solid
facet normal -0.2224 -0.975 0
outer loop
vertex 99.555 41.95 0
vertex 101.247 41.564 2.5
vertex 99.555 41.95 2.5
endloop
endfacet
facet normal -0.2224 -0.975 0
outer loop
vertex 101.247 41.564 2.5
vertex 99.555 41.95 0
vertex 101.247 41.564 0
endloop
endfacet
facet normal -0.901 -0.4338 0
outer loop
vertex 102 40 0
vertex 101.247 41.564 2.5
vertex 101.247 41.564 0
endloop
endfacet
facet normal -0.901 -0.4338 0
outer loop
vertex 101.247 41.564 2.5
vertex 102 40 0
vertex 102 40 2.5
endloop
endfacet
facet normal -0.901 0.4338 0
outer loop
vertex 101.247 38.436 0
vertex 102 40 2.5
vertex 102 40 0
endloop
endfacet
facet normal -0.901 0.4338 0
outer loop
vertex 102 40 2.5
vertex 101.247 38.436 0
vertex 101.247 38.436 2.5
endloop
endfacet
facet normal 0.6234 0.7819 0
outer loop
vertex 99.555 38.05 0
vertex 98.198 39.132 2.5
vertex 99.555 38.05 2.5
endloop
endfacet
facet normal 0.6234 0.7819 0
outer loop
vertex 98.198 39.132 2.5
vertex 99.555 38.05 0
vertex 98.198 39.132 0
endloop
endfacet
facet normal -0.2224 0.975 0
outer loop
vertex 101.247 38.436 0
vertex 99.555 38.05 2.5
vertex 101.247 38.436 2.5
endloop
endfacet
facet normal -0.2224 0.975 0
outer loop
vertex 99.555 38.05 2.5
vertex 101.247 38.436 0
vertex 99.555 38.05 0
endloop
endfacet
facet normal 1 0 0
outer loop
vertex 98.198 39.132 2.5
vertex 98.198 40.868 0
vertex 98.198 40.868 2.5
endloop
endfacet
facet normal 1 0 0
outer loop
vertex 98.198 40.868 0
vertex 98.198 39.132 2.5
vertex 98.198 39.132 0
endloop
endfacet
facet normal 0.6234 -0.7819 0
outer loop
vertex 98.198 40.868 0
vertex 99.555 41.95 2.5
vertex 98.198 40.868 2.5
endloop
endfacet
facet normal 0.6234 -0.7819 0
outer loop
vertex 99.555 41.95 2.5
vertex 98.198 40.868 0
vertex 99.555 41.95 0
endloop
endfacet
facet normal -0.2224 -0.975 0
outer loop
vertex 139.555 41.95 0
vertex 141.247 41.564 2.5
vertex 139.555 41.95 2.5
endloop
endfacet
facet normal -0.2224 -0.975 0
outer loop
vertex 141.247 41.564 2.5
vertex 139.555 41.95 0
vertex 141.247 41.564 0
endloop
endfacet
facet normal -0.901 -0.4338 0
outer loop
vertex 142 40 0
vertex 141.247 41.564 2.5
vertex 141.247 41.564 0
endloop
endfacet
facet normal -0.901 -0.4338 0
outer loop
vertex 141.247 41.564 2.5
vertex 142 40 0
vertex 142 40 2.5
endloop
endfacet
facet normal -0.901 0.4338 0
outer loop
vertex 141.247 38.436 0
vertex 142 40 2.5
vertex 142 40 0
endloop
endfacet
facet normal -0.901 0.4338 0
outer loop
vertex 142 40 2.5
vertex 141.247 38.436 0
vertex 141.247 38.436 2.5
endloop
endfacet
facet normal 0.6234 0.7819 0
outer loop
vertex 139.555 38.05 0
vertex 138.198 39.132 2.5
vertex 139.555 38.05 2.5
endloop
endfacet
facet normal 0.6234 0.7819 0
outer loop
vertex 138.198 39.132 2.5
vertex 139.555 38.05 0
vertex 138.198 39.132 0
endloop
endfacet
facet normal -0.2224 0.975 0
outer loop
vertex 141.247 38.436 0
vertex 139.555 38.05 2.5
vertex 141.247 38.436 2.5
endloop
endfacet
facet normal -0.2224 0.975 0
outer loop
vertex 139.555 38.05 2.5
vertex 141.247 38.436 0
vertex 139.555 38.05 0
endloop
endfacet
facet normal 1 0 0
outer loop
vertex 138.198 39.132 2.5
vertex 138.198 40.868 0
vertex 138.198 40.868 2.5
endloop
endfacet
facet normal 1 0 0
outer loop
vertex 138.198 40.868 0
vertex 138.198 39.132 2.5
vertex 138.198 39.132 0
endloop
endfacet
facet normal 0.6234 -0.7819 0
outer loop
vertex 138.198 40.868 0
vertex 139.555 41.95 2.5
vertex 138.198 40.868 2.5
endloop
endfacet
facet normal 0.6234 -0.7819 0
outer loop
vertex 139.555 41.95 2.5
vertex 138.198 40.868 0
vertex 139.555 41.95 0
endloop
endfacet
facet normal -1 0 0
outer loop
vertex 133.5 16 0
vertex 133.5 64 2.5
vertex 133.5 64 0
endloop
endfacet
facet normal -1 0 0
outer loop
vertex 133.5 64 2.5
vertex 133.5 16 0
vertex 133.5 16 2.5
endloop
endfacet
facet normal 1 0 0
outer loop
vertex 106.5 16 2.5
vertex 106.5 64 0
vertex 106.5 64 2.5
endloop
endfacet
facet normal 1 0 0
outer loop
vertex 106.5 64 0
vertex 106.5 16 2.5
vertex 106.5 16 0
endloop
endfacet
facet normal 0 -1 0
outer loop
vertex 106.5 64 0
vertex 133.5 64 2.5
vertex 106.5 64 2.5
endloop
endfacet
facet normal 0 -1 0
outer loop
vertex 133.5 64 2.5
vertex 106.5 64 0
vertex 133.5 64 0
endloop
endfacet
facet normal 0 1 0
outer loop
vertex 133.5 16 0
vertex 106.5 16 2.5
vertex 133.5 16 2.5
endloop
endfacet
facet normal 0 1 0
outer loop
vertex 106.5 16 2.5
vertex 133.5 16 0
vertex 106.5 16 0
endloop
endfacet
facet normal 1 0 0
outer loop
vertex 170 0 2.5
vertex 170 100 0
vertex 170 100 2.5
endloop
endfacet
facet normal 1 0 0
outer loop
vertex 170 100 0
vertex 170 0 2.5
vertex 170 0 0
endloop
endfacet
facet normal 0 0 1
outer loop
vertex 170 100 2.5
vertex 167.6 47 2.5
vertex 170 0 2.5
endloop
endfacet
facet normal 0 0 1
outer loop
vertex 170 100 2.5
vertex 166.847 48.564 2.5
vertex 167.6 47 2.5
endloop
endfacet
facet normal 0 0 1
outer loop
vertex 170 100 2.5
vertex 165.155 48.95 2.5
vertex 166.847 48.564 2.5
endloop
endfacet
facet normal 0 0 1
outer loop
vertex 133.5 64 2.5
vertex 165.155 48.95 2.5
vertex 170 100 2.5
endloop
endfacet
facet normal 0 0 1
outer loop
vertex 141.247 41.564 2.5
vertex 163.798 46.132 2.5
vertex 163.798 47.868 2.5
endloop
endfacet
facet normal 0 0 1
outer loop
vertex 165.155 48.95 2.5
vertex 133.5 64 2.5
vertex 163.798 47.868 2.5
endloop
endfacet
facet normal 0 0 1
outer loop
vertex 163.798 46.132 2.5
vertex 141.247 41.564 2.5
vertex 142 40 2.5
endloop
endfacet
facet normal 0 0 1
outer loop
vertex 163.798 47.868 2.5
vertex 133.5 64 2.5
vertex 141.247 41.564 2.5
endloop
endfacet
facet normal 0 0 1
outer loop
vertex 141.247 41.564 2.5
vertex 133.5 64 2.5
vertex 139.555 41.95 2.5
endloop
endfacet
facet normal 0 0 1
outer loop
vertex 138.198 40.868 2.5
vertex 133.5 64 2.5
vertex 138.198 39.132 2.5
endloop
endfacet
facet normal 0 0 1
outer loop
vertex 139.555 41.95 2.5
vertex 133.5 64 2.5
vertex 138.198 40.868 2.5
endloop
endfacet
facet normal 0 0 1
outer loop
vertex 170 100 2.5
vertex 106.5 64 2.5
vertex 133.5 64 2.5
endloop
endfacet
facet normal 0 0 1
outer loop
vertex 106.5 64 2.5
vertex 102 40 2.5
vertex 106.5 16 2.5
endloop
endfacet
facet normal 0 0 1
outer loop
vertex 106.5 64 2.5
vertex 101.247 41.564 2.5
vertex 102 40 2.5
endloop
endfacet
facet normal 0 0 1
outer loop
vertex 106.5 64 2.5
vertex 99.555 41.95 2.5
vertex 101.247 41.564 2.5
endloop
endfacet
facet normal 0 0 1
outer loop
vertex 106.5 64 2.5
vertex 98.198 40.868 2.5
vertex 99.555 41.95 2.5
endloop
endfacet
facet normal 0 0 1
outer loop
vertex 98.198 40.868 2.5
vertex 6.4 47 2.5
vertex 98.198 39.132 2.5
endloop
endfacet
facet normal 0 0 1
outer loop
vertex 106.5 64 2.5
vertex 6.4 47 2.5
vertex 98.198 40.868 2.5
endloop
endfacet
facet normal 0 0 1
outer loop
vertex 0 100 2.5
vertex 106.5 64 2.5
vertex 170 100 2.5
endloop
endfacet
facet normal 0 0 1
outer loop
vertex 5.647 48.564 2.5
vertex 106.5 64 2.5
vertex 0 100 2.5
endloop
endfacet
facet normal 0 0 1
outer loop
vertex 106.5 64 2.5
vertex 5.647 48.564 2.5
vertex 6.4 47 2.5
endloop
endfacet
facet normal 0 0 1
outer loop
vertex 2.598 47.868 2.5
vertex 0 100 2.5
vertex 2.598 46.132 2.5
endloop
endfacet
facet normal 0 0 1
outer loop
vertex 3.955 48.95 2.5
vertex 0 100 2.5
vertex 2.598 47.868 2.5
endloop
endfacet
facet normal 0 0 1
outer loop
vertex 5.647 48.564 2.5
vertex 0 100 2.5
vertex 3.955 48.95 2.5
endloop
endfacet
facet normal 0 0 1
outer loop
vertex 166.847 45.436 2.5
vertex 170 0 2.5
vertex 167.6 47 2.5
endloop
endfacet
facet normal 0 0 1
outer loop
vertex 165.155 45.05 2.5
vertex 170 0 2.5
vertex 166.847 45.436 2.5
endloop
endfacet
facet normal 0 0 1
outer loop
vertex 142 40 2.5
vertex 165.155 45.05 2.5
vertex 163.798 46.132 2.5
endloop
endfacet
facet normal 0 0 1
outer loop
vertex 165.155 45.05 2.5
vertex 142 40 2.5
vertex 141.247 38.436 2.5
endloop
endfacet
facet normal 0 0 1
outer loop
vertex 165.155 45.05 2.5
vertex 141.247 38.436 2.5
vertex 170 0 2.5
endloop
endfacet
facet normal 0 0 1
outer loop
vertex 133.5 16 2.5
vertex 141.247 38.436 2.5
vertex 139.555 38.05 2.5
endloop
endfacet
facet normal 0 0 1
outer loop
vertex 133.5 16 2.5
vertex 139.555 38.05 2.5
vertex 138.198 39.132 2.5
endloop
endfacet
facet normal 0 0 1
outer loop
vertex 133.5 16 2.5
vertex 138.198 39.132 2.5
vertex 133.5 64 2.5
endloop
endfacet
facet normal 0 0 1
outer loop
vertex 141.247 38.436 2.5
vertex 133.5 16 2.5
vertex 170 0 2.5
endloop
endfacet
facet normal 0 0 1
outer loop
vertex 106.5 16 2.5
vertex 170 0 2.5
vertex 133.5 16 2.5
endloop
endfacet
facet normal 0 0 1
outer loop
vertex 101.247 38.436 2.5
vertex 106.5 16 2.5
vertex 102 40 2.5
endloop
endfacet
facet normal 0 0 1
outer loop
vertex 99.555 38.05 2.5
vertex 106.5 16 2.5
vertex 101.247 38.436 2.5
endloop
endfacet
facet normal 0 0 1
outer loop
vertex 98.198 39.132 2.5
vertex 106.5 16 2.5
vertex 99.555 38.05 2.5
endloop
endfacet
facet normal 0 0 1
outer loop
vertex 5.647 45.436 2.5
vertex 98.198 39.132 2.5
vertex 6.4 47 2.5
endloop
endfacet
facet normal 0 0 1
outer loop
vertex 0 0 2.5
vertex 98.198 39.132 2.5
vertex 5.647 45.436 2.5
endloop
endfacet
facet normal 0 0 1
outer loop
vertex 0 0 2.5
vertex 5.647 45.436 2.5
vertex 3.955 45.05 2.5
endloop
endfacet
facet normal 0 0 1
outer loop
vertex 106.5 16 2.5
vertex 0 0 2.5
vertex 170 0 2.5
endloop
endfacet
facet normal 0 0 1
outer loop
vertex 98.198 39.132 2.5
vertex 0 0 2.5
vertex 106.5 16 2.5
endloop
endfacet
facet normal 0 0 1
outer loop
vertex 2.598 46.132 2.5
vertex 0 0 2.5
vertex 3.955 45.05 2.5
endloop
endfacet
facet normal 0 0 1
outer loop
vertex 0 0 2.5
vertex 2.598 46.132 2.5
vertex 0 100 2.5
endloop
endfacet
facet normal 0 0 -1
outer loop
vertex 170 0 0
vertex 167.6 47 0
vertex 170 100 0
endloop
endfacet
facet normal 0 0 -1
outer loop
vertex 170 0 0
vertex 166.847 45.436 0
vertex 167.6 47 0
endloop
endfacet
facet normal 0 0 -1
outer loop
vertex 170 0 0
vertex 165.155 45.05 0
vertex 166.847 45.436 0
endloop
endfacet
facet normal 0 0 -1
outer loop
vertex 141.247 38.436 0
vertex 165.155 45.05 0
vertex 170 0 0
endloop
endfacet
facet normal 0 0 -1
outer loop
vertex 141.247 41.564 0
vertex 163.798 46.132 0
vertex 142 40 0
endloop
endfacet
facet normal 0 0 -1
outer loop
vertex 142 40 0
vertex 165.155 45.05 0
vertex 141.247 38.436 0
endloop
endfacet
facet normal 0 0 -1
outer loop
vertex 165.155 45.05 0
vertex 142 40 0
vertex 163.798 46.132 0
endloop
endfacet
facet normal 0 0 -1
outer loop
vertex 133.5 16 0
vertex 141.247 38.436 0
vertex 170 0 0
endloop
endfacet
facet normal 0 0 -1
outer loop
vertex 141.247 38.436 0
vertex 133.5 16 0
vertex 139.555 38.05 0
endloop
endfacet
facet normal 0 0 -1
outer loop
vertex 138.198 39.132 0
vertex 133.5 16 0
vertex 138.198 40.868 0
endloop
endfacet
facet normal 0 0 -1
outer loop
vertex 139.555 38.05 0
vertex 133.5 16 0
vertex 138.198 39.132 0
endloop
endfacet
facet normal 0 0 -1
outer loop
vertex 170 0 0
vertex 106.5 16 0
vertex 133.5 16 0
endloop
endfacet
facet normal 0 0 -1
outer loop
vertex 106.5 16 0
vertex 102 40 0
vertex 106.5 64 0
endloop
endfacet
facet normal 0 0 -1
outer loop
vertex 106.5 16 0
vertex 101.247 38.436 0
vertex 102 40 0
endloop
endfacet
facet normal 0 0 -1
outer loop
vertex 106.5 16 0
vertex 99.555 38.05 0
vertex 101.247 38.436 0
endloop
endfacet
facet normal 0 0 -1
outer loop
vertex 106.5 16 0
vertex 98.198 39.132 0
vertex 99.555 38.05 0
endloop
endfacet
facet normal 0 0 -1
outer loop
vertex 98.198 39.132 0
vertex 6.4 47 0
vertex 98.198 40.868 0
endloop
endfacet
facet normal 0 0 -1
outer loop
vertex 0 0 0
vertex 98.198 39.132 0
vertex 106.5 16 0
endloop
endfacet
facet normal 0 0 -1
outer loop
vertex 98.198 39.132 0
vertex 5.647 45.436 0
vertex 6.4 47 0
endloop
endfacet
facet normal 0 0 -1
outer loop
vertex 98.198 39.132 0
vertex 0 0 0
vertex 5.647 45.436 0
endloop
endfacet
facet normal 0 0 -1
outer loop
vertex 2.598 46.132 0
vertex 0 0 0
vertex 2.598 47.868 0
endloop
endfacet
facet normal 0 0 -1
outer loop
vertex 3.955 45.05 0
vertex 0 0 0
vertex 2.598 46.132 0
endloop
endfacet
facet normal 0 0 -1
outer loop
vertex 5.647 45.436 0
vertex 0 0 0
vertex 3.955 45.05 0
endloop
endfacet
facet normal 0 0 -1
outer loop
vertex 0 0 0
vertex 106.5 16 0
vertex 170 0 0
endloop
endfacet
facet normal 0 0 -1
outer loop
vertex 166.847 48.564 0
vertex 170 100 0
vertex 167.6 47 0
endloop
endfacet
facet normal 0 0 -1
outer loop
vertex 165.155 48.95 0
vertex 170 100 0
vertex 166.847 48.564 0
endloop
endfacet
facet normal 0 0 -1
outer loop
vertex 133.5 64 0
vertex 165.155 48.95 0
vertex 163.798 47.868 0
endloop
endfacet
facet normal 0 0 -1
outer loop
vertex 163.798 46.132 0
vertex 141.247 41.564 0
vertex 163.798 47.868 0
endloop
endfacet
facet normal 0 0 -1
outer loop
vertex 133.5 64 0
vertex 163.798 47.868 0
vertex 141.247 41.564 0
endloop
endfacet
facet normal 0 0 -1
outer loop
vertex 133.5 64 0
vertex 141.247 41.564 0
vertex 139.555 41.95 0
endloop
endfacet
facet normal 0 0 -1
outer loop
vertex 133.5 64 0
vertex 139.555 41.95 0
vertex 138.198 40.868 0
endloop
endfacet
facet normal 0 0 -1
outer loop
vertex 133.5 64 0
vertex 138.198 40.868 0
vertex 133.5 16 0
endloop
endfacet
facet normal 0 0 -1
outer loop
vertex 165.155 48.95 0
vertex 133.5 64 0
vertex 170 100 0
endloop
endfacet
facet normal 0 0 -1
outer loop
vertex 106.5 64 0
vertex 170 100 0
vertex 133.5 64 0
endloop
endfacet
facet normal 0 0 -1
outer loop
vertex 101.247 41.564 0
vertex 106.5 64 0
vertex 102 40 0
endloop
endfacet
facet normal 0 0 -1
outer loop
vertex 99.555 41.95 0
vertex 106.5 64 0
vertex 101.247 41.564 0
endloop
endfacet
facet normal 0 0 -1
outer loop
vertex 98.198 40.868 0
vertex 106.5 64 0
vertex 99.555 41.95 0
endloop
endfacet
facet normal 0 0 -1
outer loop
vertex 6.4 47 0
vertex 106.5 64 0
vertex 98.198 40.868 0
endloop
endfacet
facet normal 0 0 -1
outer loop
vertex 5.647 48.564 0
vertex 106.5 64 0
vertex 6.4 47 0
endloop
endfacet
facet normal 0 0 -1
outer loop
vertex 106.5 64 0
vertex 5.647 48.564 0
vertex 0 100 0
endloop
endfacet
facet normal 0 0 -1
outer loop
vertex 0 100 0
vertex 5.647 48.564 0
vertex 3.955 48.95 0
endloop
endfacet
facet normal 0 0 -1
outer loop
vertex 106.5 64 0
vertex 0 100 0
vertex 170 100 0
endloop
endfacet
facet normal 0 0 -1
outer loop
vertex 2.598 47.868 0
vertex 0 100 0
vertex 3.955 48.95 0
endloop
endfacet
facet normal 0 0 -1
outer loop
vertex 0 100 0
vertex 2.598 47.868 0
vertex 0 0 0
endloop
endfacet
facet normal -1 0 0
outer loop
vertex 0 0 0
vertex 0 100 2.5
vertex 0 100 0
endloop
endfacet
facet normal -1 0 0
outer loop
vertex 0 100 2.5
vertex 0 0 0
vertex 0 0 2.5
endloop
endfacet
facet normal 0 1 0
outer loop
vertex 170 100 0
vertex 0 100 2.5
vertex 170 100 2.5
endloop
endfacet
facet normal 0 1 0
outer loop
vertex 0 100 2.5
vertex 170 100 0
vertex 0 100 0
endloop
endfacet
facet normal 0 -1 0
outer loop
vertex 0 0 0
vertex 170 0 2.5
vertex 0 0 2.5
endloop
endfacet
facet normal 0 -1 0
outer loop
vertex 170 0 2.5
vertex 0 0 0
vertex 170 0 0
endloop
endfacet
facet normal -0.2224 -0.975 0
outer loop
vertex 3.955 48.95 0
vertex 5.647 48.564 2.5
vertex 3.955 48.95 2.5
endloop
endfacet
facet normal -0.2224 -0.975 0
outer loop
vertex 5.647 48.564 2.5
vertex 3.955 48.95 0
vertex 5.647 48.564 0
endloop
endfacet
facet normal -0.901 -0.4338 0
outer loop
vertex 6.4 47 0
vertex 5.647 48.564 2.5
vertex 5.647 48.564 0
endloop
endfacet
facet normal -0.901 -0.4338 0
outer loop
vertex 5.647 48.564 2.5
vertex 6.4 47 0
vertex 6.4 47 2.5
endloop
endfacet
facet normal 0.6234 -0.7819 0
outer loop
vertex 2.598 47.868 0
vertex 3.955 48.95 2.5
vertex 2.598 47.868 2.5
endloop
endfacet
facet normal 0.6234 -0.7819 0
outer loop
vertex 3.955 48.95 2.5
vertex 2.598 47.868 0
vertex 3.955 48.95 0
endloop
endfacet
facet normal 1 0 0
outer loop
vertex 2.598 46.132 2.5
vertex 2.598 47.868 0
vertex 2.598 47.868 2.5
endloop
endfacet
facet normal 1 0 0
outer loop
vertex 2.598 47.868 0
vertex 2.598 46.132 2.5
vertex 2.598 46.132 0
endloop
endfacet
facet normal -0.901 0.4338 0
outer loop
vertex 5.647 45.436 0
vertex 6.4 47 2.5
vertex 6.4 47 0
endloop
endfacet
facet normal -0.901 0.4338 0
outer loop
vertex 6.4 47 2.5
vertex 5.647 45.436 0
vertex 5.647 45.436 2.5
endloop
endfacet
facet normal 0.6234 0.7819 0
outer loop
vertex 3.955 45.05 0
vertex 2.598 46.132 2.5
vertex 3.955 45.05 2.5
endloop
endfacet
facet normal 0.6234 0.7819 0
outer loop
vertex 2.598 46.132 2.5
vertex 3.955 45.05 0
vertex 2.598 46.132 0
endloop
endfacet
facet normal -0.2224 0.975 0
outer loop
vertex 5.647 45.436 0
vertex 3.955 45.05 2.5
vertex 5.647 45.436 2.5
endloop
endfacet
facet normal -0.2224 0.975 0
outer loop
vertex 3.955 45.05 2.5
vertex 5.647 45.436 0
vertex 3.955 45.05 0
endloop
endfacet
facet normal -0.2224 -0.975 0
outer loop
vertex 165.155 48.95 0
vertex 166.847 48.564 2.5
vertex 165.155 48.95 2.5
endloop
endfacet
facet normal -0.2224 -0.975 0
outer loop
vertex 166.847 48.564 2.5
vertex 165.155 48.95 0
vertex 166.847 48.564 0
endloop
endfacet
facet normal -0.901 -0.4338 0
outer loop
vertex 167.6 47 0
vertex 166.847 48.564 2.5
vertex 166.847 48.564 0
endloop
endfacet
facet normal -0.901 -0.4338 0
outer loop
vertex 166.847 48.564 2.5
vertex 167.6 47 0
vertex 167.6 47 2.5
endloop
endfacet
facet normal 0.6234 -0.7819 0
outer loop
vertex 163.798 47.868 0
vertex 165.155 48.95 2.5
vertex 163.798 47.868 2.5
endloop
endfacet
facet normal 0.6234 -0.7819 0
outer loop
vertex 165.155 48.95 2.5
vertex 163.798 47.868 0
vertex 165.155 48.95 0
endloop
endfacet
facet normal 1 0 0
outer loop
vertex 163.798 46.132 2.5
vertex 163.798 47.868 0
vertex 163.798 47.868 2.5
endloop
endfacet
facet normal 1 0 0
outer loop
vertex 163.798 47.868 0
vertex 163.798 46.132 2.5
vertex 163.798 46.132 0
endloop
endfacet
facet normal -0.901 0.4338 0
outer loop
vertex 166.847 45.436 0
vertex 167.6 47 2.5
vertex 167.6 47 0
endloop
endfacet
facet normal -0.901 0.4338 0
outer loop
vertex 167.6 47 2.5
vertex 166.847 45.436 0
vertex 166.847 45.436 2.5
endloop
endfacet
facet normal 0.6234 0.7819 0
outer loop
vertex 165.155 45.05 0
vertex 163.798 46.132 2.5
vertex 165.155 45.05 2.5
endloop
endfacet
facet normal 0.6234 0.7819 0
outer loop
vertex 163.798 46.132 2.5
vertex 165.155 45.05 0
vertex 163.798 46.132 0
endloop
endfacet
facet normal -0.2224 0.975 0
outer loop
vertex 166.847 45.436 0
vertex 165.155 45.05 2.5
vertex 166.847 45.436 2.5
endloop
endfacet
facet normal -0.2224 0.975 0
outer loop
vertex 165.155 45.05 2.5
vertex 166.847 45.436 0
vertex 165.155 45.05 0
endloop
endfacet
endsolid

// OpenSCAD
screw_hole_radius = 4/2;

difference() {
  cube([170,100,2.5]);

  translate([4.4,47,-1])
    cylinder(5,screw_hole_radius,screw_hole_radius);

  translate([170-4.4,47,-1])
    cylinder(5,2,2);

  translate([100,40,-1]) {
    translate([(40-27)/2,-48/2,0])
    cube([27,48,5]);

    for (x_coord = [0, 40]) {
      translate([x_coord,0,0])
        cylinder(5,screw_hole_radius,screw_hole_radius);
    }
  }
}
